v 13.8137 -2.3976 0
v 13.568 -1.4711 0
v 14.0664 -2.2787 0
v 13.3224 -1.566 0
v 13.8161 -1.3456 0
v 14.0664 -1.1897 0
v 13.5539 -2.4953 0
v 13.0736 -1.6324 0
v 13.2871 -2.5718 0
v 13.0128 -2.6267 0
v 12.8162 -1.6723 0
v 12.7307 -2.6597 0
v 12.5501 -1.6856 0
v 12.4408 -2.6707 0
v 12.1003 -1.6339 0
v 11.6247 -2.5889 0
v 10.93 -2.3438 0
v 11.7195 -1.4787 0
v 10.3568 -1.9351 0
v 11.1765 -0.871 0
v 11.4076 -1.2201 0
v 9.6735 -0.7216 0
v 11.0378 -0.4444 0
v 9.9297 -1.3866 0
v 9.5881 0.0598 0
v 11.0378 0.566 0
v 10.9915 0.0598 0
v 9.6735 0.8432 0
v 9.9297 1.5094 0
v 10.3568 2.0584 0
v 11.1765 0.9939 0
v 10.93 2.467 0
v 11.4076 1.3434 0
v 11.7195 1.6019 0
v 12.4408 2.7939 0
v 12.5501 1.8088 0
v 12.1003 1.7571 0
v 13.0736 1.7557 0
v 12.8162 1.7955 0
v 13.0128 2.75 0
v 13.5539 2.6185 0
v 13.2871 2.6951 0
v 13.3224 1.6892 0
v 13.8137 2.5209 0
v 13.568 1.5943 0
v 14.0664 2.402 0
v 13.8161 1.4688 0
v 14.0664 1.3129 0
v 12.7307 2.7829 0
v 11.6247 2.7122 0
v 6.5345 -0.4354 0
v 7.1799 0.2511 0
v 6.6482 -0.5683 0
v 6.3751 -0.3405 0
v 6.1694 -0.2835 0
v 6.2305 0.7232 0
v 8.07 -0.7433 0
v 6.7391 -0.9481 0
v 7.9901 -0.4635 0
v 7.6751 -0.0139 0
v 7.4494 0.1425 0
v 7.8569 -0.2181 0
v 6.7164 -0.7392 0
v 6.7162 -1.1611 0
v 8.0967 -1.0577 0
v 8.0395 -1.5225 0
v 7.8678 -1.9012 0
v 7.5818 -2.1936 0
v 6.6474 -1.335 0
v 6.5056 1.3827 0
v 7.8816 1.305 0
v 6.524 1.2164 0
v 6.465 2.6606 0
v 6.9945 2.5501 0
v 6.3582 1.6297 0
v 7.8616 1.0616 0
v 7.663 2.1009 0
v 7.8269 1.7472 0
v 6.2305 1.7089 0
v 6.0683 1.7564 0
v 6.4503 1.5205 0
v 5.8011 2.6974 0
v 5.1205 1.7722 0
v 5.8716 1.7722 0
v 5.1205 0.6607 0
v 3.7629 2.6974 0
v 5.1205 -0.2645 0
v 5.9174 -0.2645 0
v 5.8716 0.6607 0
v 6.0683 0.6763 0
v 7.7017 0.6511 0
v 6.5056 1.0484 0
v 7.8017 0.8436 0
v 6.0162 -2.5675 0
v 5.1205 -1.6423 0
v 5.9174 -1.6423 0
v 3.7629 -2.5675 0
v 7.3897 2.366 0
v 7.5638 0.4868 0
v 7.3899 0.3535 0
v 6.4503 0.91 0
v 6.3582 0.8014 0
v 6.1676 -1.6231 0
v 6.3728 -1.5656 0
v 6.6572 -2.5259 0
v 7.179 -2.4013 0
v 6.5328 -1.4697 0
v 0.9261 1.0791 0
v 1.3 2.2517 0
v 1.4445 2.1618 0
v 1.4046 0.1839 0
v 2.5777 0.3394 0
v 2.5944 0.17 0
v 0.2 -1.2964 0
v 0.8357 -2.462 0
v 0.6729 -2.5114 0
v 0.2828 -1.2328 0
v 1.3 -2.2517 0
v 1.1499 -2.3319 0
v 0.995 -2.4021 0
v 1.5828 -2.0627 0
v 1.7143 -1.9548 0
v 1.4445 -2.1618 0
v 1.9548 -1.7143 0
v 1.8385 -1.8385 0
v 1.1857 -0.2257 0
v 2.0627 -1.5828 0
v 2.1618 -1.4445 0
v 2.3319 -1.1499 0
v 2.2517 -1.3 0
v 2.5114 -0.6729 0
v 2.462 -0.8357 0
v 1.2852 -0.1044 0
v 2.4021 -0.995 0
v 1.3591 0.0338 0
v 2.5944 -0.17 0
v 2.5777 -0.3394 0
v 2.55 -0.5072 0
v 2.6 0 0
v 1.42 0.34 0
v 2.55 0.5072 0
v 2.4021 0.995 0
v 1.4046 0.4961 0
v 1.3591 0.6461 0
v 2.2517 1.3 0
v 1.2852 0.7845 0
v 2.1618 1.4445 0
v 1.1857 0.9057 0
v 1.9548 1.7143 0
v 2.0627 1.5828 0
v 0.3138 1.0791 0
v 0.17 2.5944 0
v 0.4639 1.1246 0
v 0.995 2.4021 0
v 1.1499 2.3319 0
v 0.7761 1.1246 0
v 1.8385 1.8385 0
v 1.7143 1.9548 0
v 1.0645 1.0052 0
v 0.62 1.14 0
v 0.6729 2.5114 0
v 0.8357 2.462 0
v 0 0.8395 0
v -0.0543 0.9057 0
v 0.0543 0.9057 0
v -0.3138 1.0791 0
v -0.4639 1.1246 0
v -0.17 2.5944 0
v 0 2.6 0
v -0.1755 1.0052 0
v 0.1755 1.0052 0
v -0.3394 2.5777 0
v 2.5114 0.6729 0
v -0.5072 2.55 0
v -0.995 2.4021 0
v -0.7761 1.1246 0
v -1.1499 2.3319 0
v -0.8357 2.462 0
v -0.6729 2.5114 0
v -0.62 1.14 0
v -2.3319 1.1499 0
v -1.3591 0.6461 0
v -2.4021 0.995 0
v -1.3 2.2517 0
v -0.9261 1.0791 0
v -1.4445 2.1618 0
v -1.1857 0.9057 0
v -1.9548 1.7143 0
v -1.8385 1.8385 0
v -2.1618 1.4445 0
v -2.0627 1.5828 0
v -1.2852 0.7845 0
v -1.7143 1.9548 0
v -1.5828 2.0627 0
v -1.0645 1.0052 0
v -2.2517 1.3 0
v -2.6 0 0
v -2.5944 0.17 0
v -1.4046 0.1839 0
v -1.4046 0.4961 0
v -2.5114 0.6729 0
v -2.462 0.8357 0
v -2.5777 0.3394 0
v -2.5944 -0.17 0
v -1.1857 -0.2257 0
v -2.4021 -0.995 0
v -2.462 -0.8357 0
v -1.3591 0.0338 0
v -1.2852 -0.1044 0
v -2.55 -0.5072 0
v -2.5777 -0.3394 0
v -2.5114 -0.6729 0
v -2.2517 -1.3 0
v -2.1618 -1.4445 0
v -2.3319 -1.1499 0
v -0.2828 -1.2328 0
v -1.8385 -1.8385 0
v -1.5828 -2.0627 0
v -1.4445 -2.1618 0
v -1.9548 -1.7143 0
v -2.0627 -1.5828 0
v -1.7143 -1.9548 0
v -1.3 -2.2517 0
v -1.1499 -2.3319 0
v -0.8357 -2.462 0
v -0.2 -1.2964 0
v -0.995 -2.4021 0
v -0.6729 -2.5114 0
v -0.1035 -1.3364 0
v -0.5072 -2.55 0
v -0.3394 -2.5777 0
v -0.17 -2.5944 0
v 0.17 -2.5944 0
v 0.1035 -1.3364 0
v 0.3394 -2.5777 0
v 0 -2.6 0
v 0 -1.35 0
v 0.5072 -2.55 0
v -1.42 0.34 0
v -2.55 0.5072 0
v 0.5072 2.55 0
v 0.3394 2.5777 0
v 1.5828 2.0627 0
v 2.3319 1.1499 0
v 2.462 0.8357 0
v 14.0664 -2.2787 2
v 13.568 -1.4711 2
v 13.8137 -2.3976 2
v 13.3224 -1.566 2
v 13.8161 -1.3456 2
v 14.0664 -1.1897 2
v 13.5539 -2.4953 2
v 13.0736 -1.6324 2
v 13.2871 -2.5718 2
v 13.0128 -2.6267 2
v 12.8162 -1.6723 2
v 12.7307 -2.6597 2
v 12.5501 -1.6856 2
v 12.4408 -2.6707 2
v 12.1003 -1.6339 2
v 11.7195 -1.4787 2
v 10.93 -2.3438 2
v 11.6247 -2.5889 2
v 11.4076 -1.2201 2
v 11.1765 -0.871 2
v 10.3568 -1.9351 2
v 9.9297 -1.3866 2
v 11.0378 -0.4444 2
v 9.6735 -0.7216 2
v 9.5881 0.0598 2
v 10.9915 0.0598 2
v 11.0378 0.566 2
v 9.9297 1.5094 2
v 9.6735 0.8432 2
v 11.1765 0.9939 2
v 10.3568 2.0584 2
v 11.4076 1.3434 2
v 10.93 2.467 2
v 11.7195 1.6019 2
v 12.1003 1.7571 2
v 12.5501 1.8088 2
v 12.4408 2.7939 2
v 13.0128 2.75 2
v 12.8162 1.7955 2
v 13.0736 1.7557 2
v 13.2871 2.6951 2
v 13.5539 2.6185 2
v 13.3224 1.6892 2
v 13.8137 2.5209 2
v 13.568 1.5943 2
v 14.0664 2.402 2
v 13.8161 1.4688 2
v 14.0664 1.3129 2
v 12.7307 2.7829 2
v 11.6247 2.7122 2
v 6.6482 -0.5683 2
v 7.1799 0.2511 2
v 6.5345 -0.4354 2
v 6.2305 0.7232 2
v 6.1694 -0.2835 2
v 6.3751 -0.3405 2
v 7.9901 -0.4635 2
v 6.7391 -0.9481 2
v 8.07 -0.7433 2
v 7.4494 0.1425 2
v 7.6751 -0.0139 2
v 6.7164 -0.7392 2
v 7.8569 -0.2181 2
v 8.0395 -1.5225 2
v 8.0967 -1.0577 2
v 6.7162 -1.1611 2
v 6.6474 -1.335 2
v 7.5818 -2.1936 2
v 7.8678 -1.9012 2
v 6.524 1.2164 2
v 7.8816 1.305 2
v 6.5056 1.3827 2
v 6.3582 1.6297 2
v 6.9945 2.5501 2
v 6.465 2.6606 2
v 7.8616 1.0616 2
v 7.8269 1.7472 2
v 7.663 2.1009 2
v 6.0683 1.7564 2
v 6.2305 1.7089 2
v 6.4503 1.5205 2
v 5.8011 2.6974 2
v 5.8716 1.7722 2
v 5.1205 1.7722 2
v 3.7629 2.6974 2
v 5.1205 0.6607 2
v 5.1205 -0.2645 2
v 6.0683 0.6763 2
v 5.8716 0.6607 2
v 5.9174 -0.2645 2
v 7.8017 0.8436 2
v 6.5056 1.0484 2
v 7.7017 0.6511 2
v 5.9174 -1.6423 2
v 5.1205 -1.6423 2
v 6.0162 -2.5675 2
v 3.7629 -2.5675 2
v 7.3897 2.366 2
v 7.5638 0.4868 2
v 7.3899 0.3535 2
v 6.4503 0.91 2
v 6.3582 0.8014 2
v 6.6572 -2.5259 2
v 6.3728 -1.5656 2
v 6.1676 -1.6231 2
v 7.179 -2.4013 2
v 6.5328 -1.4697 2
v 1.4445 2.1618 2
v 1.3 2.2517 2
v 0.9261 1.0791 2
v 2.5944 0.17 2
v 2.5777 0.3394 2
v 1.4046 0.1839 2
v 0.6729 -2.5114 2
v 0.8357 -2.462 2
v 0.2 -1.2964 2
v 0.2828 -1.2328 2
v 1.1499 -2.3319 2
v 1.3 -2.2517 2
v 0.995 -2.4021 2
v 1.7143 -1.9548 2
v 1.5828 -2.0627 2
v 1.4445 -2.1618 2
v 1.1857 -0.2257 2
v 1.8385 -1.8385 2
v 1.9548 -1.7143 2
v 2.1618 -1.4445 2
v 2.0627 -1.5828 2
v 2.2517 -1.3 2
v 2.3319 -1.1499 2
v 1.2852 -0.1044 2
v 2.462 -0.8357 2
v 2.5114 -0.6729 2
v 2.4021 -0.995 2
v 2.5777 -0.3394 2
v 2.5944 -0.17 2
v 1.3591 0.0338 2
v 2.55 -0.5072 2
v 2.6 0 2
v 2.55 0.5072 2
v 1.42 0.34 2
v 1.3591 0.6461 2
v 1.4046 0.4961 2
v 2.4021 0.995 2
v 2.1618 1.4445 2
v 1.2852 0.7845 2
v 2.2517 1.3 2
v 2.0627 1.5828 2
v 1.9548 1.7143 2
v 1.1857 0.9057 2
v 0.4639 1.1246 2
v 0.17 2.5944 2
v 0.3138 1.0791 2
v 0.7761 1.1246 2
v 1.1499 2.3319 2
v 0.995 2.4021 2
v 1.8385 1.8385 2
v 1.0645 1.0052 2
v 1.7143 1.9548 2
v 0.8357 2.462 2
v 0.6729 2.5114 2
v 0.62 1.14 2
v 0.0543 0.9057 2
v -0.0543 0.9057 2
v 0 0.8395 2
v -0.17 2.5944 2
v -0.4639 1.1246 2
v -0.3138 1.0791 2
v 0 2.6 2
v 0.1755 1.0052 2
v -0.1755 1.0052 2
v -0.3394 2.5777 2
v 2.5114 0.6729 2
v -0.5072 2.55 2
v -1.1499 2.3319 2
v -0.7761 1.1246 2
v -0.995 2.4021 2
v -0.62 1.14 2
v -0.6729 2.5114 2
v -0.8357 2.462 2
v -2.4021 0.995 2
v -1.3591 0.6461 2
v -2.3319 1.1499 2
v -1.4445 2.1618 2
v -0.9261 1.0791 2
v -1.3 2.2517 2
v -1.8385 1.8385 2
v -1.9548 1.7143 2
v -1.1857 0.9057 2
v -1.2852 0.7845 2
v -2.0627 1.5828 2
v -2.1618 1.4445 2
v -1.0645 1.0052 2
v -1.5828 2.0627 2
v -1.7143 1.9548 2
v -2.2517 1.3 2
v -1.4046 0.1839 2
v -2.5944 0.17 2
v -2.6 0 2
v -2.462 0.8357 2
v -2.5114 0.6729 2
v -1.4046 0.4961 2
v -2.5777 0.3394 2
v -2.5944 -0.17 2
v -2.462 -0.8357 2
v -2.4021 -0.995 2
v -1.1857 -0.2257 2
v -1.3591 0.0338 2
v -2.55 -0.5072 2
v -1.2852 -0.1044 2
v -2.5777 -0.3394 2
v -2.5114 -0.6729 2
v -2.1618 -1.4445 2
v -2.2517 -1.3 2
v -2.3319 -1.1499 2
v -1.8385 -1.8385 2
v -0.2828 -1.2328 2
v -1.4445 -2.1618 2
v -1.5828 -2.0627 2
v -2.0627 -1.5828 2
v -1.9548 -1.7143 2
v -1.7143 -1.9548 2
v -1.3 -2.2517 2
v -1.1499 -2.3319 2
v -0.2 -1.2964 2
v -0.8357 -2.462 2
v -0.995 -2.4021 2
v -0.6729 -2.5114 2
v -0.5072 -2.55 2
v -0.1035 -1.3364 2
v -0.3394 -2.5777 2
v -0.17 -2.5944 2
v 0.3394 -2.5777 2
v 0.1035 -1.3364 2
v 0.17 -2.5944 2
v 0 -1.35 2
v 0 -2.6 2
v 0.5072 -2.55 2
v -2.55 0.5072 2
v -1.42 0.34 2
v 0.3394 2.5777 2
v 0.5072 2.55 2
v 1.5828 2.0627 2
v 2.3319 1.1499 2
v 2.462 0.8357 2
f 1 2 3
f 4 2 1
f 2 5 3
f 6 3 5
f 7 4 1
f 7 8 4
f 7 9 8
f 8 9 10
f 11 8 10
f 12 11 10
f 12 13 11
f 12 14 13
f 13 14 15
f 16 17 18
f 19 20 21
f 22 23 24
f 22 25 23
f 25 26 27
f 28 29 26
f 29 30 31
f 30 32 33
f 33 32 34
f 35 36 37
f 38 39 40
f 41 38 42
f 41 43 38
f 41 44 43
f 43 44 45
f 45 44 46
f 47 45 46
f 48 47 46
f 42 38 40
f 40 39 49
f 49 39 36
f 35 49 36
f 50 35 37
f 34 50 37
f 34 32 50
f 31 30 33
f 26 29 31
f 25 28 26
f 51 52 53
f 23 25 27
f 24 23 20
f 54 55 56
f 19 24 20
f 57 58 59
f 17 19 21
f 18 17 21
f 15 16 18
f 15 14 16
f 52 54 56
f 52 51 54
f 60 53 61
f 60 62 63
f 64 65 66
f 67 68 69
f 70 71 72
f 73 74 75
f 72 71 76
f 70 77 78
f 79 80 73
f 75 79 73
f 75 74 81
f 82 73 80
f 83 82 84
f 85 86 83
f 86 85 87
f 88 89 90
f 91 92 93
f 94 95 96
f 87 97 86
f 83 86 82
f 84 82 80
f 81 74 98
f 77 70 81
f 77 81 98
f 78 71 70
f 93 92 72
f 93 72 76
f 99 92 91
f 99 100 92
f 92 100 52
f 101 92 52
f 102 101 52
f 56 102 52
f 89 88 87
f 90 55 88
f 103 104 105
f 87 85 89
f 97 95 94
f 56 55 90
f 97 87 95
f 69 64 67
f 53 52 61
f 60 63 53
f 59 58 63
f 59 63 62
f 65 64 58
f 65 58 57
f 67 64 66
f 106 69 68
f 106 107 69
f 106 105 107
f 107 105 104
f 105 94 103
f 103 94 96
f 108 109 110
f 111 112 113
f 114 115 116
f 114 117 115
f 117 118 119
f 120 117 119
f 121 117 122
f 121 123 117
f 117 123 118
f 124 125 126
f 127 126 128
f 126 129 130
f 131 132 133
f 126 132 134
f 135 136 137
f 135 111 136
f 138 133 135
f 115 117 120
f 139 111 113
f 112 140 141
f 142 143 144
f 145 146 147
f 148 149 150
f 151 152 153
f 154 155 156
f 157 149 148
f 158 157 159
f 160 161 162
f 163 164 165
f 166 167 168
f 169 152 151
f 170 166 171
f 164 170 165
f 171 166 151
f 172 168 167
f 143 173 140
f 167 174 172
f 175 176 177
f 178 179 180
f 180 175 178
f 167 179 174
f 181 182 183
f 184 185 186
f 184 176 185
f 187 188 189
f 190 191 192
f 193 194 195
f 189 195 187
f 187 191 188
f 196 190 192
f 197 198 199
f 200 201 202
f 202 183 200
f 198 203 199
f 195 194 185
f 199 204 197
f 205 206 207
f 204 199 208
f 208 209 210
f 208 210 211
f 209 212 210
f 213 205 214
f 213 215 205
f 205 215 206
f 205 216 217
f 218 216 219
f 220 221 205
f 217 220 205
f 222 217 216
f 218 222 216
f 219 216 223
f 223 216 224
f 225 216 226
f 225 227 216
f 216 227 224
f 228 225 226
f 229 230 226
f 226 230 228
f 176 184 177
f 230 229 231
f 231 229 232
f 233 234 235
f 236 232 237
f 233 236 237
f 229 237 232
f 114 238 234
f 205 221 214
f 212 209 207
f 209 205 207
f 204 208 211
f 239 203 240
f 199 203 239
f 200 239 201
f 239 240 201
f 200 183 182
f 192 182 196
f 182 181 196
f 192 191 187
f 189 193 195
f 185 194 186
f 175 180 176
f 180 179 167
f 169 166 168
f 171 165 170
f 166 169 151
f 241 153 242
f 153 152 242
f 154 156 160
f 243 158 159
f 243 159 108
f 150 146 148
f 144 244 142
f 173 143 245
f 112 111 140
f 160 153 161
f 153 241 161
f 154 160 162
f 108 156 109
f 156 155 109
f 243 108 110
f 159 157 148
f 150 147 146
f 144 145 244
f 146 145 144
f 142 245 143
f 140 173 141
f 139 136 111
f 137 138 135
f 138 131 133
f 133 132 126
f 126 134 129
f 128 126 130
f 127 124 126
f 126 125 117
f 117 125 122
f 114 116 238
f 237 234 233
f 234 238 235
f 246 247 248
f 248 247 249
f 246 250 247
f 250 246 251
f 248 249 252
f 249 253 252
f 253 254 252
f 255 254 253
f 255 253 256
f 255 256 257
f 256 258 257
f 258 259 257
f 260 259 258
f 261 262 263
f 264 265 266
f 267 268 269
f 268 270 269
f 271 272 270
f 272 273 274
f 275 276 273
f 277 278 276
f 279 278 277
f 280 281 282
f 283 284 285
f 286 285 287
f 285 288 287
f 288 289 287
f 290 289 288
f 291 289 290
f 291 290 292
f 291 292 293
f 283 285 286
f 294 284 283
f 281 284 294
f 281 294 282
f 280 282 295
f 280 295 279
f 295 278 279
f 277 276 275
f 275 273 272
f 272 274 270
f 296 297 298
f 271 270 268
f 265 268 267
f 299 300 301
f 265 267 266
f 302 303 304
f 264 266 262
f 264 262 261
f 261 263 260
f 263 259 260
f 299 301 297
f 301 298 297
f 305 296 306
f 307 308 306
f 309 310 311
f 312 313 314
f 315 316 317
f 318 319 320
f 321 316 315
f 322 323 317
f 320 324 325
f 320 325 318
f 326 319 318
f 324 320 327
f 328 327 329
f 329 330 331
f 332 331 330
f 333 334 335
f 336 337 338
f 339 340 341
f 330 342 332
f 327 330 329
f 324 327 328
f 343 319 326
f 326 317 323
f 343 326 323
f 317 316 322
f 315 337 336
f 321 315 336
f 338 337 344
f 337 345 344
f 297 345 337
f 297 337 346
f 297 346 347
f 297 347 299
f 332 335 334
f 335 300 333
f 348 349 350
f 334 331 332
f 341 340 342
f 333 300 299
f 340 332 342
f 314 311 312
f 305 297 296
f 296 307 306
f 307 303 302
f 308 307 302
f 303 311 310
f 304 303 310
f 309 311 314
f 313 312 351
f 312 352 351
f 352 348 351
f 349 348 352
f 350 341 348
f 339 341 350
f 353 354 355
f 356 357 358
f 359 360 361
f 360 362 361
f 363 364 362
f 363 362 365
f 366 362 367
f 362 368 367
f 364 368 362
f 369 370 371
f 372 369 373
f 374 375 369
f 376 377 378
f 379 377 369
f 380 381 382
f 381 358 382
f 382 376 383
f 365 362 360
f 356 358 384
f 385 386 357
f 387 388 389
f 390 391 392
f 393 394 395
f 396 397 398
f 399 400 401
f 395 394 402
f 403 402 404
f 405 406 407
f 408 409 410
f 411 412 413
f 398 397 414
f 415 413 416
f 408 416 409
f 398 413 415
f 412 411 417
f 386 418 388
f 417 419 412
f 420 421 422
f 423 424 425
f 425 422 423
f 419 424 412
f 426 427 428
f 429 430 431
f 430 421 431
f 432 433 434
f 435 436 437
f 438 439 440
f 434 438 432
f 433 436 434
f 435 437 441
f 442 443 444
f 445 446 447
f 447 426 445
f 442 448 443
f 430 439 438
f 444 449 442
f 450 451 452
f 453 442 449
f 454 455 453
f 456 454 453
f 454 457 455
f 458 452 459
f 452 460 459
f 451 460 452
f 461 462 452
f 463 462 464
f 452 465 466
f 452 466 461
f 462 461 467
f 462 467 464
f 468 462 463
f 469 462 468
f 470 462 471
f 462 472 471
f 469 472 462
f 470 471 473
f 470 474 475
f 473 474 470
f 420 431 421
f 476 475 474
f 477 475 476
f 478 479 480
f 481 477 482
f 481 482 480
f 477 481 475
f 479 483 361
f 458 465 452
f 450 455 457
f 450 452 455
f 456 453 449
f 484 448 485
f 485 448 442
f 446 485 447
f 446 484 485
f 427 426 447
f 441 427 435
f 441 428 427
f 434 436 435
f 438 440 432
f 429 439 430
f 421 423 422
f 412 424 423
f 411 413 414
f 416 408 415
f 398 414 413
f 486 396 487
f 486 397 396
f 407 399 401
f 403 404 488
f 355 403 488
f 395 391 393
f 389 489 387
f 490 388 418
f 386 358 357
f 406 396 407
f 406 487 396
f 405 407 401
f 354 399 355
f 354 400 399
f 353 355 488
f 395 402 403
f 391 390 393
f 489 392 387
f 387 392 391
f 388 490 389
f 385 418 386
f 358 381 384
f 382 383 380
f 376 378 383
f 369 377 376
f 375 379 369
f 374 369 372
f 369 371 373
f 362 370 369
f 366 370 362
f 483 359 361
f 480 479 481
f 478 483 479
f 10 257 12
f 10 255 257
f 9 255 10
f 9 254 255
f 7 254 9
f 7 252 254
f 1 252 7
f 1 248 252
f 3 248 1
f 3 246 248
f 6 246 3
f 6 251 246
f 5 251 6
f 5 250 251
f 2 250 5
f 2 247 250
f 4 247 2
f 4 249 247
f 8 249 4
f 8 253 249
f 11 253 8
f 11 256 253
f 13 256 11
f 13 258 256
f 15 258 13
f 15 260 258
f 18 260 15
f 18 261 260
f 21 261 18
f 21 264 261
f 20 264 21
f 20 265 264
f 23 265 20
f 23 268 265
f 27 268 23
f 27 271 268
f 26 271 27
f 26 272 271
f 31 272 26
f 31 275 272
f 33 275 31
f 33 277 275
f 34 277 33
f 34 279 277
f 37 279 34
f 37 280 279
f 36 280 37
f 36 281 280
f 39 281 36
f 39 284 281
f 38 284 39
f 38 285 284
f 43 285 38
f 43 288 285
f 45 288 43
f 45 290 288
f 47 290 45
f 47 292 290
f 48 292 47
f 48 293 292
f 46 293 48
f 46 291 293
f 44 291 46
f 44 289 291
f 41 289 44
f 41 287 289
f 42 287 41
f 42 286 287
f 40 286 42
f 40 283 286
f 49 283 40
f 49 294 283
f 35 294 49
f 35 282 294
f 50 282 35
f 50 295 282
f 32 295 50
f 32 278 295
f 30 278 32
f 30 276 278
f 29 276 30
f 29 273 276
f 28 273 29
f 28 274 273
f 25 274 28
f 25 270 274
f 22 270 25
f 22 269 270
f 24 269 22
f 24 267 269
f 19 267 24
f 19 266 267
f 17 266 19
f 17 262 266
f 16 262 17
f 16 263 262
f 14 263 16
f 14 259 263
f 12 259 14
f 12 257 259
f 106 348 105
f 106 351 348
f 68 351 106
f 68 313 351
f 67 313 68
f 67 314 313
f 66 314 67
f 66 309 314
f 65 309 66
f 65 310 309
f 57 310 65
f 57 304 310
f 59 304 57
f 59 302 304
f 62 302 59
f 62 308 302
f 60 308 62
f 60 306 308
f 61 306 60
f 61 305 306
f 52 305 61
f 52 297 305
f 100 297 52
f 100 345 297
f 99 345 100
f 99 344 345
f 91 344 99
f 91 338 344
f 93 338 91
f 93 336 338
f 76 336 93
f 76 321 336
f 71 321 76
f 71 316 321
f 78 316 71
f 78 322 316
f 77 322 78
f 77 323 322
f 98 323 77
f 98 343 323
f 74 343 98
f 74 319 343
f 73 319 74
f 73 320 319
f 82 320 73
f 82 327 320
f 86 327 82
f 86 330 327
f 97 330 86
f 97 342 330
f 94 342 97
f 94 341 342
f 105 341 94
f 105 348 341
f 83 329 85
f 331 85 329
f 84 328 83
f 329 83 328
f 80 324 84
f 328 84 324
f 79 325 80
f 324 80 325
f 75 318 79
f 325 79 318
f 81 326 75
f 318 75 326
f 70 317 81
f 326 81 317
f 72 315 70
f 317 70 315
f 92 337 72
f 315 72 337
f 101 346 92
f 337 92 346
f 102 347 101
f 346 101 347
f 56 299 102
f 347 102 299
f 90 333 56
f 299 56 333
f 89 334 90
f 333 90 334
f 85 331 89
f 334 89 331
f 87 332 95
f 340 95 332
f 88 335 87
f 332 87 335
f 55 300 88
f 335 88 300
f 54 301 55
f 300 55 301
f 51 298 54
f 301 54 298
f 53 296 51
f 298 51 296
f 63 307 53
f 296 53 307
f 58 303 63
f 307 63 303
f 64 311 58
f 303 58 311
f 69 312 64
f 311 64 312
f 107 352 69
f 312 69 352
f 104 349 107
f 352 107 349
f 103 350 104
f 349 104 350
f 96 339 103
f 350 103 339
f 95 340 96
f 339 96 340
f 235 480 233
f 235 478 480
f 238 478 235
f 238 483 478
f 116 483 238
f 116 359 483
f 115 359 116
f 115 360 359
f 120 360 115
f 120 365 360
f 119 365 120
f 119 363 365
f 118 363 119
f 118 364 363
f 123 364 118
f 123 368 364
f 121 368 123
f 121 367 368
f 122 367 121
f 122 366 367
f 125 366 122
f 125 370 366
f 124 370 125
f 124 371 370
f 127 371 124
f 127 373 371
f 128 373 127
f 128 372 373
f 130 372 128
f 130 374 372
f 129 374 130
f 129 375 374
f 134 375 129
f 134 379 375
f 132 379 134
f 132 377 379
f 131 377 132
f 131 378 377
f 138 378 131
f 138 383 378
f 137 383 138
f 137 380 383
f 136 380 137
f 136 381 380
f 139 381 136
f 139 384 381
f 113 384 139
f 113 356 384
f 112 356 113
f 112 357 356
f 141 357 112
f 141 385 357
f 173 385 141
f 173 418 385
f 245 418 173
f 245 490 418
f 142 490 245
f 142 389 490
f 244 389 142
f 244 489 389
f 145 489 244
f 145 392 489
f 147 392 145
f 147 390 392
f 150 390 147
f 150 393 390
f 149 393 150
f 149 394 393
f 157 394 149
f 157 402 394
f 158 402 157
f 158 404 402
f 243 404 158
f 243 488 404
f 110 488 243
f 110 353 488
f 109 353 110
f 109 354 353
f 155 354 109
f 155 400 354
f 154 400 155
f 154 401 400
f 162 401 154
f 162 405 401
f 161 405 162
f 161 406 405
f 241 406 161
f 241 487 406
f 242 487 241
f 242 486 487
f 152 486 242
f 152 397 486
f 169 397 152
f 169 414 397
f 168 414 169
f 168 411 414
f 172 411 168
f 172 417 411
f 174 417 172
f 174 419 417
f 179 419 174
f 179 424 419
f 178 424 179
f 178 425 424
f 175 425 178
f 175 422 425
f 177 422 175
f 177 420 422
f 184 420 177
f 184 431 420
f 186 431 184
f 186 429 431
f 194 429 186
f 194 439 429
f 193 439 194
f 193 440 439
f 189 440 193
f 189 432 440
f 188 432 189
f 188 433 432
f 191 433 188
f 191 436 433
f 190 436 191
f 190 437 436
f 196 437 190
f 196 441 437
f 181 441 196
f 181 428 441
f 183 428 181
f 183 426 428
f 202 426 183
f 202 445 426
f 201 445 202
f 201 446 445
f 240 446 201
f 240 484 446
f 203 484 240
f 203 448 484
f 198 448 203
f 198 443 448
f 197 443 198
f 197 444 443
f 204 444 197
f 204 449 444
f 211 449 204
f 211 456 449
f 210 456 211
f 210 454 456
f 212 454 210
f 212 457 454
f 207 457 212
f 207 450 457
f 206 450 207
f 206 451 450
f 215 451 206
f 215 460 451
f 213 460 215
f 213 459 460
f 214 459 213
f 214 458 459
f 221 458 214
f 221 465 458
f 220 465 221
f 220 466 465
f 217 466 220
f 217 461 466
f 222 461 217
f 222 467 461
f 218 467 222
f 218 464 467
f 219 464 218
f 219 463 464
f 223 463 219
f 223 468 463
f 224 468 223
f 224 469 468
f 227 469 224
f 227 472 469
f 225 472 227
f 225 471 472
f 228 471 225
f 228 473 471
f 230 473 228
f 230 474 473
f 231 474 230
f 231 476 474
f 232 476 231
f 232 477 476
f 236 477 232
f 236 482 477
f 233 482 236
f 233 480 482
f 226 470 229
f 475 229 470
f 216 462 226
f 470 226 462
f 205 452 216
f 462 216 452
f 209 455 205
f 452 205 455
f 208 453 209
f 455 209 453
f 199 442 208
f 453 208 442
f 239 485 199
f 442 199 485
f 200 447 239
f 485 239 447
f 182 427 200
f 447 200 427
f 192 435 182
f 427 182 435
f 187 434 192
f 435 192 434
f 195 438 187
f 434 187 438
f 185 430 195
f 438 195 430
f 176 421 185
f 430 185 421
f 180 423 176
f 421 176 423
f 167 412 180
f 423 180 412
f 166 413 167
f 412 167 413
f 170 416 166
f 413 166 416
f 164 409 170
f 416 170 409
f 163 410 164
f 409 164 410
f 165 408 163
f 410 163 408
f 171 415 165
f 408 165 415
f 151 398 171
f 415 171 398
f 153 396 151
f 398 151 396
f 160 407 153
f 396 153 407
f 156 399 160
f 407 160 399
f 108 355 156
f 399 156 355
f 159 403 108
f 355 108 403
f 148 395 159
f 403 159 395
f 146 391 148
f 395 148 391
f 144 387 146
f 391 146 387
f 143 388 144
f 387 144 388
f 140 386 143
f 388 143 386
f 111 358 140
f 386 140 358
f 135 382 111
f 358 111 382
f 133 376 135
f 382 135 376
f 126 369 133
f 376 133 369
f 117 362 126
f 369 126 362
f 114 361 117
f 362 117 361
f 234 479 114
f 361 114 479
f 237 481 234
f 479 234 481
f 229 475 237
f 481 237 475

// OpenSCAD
// Five more OBC marks (2026-10-14), asked for as "more professional and also
// fun": one clean geometric face, Poppins Bold, and one playful detail each.
// Drawn at the smallest size each engraves cleanly; the same 2D shape is the
// logo and the cutter.
//
// design = 6..10, part = "engrave" | "accent"
//   engrave  what is cut into the print, one colour
//   accent   the playful detail's second colour, for screens and the shop
//            icon only; never cut, so it is not part of the engraving
//   6 heart    the O's counter is a heart
//   7 smile    OBC smiling: a gentle arc under the word
//   8 tiles    O, B and C knocked out of three tiles, a star in the fourth
//   9 cat      the O wears two cat ears
//  10 sparkle  a sparkle at the C's shoulder
design = 6;
part = "engrave";

B2 = 0.9;                   // two beads: the floor for every stroke and every wall
P = 5.2;                    // the letters' size: strokes 1.2 mm, 2.9 beads
SP = 1.14;                  // letter spacing: Poppins' own left 0.78 mm between letters
module word(s, sz = P, sp = SP) text(s, size = sz, font = "Poppins:style=Bold", halign = "center", valign = "center", spacing = sp);
module printable() offset(r = 0.21, $fn = 12) offset(delta = -0.21) children();
module closed() offset(r = -B2 / 2, $fn = 12) offset(delta = B2 / 2) children();

// a ring the weight of Poppins' O, and BC set after it: B starts 0.45 into its
// box, so the gap is 0.95, two beads
OR = P / 2;                 // the O's outer radius
OW = 1.2;                   // its stroke
module o_ring() difference() { circle(r = OR, $fn = 96); circle(r = OR - OW, $fn = 96); }
module bc_after_o() translate([OR + 0.5, 0]) text("BC", size = P, font = "Poppins:style=Bold", halign = "left", valign = "center", spacing = SP);

// ---- 6: heart --------------------------------------------------------------------------------
// the O filled, less a heart; the heart's tip blunted to a 0.45 round, since
// the heart is plastic left standing and a sharp tip would not print
module heart2d() for (s = [-1, 1]) hull() { translate([s * 0.62, 0.34]) circle(r = 0.8, $fn = 32); translate([0, -0.95]) circle(r = 0.4, $fn = 24); }   // a hull per lobe: one hull over both filled the notch and read as a shield
module heart() {
    difference() { circle(r = OR, $fn = 96); heart2d(); }
    bc_after_o();
}

// ---- 7: smile --------------------------------------------------------------------------------
// an arc under the word, one stroke wide, sagging 1 mm over 13: every point of
// it two beads and more below the letters
function arc(c, r, a0, a1, n = 32) = [for (i = [0 : n]) let (a = a0 + (a1 - a0) * i / n) [c[0] + r * cos(a), c[1] + r * sin(a)]];
module stroke(pts, w) for (i = [0 : len(pts) - 2]) hull() { translate(pts[i]) circle(d = w, $fn = 24); translate(pts[i + 1]) circle(d = w, $fn = 24); }
SR = 21.6; SY = -4.0;       // the smile's radius, and the height of its ends
module smile_arc() let (a = asin(6.5 / SR)) stroke(arc([0, SY - 1.0 + SR], SR, 270 - a, 270 + a), 1.0);
module smile() { word("OBC"); smile_arc(); }

// ---- 8: tiles --------------------------------------------------------------------------------
// four rounded tiles cut in, a wall two beads and more between them; the
// letters and the star are what is left standing, so they are walls too
T = 6.6; TG = 1.0;
module tile(i, j) translate([(i - 0.5) * (T + TG), (0.5 - j) * (T + TG)]) offset(r = 1.2, $fn = 24) square(T - 2.4, center = true);
module at(i, j) translate([(i - 0.5) * (T + TG), (0.5 - j) * (T + TG)]) children();
module star2d(r, k) offset(r = 0.3, $fn = 12) offset(delta = -0.3)
    polygon([for (n = [0 : 9]) let (a = 90 + 36 * n, rr = n % 2 == 0 ? r : r * k) [rr * cos(a), rr * sin(a)]]);
module tiles() printable() difference() {
    union() { tile(0, 0); tile(1, 0); tile(0, 1); tile(1, 1); }
    at(0, 0) word("O", 4.4); at(1, 0) word("B", 4.4); at(0, 1) word("C", 4.4);
    at(1, 1) translate([0, -0.2]) star2d(2.4, 0.5);
}
module tiles_accent() difference() { tile(1, 1); at(1, 1) translate([0, -0.2]) star2d(2.4, 0.5); }

// ---- 9: cat ----------------------------------------------------------------------------------
// two rounded ears on the O, leaning out 25 deg; the inner ear is the accent
module ear(s) rotate(s * 28) translate([0, OR - 0.6]) offset(r = 0.35, $fn = 16) offset(delta = -0.35)
    polygon([[-1.15, 0], [1.15, 0], [0.1 * s, 2.3]]);
module cat() { o_ring(); for (s = [-1, 1]) ear(s); bc_after_o(); }
module cat_accent() for (s = [-1, 1]) rotate(s * 28) translate([0, OR - 0.6]) offset(delta = -0.45) polygon([[-1.15, 0.1], [1.15, 0.1], [0.1 * s, 2.3]]);

// ---- 10: sparkle -----------------------------------------------------------------------------
// a four-point sparkle off the C's shoulder, its points rounded so they print
module sparkle2d() offset(r = 0.28, $fn = 12) offset(delta = -0.28)
    polygon([for (n = [0 : 7]) let (a = 90 + 45 * n, rr = n % 2 == 0 ? 2.1 : 0.62) [rr * cos(a), rr * sin(a)]]);
SPX = 9.6; SPY = 2.9;
module sparkle() { word("OBC"); translate([SPX, SPY]) sparkle2d(); }
module sparkle_accent() translate([SPX, SPY]) sparkle2d();

module logo(d) {
    if (d == 6) heart();
    if (d == 7) smile();
    if (d == 8) tiles();
    if (d == 9) cat();
    if (d == 10) sparkle();
}
module accent(d) {
    if (d == 6) heart2d();
    if (d == 7) smile_arc();
    if (d == 8) tiles_accent();
    if (d == 9) cat_accent();
    if (d == 10) sparkle_accent();
}
linear_extrude(2) { if (part == "engrave") logo(design); else accent(design); }
